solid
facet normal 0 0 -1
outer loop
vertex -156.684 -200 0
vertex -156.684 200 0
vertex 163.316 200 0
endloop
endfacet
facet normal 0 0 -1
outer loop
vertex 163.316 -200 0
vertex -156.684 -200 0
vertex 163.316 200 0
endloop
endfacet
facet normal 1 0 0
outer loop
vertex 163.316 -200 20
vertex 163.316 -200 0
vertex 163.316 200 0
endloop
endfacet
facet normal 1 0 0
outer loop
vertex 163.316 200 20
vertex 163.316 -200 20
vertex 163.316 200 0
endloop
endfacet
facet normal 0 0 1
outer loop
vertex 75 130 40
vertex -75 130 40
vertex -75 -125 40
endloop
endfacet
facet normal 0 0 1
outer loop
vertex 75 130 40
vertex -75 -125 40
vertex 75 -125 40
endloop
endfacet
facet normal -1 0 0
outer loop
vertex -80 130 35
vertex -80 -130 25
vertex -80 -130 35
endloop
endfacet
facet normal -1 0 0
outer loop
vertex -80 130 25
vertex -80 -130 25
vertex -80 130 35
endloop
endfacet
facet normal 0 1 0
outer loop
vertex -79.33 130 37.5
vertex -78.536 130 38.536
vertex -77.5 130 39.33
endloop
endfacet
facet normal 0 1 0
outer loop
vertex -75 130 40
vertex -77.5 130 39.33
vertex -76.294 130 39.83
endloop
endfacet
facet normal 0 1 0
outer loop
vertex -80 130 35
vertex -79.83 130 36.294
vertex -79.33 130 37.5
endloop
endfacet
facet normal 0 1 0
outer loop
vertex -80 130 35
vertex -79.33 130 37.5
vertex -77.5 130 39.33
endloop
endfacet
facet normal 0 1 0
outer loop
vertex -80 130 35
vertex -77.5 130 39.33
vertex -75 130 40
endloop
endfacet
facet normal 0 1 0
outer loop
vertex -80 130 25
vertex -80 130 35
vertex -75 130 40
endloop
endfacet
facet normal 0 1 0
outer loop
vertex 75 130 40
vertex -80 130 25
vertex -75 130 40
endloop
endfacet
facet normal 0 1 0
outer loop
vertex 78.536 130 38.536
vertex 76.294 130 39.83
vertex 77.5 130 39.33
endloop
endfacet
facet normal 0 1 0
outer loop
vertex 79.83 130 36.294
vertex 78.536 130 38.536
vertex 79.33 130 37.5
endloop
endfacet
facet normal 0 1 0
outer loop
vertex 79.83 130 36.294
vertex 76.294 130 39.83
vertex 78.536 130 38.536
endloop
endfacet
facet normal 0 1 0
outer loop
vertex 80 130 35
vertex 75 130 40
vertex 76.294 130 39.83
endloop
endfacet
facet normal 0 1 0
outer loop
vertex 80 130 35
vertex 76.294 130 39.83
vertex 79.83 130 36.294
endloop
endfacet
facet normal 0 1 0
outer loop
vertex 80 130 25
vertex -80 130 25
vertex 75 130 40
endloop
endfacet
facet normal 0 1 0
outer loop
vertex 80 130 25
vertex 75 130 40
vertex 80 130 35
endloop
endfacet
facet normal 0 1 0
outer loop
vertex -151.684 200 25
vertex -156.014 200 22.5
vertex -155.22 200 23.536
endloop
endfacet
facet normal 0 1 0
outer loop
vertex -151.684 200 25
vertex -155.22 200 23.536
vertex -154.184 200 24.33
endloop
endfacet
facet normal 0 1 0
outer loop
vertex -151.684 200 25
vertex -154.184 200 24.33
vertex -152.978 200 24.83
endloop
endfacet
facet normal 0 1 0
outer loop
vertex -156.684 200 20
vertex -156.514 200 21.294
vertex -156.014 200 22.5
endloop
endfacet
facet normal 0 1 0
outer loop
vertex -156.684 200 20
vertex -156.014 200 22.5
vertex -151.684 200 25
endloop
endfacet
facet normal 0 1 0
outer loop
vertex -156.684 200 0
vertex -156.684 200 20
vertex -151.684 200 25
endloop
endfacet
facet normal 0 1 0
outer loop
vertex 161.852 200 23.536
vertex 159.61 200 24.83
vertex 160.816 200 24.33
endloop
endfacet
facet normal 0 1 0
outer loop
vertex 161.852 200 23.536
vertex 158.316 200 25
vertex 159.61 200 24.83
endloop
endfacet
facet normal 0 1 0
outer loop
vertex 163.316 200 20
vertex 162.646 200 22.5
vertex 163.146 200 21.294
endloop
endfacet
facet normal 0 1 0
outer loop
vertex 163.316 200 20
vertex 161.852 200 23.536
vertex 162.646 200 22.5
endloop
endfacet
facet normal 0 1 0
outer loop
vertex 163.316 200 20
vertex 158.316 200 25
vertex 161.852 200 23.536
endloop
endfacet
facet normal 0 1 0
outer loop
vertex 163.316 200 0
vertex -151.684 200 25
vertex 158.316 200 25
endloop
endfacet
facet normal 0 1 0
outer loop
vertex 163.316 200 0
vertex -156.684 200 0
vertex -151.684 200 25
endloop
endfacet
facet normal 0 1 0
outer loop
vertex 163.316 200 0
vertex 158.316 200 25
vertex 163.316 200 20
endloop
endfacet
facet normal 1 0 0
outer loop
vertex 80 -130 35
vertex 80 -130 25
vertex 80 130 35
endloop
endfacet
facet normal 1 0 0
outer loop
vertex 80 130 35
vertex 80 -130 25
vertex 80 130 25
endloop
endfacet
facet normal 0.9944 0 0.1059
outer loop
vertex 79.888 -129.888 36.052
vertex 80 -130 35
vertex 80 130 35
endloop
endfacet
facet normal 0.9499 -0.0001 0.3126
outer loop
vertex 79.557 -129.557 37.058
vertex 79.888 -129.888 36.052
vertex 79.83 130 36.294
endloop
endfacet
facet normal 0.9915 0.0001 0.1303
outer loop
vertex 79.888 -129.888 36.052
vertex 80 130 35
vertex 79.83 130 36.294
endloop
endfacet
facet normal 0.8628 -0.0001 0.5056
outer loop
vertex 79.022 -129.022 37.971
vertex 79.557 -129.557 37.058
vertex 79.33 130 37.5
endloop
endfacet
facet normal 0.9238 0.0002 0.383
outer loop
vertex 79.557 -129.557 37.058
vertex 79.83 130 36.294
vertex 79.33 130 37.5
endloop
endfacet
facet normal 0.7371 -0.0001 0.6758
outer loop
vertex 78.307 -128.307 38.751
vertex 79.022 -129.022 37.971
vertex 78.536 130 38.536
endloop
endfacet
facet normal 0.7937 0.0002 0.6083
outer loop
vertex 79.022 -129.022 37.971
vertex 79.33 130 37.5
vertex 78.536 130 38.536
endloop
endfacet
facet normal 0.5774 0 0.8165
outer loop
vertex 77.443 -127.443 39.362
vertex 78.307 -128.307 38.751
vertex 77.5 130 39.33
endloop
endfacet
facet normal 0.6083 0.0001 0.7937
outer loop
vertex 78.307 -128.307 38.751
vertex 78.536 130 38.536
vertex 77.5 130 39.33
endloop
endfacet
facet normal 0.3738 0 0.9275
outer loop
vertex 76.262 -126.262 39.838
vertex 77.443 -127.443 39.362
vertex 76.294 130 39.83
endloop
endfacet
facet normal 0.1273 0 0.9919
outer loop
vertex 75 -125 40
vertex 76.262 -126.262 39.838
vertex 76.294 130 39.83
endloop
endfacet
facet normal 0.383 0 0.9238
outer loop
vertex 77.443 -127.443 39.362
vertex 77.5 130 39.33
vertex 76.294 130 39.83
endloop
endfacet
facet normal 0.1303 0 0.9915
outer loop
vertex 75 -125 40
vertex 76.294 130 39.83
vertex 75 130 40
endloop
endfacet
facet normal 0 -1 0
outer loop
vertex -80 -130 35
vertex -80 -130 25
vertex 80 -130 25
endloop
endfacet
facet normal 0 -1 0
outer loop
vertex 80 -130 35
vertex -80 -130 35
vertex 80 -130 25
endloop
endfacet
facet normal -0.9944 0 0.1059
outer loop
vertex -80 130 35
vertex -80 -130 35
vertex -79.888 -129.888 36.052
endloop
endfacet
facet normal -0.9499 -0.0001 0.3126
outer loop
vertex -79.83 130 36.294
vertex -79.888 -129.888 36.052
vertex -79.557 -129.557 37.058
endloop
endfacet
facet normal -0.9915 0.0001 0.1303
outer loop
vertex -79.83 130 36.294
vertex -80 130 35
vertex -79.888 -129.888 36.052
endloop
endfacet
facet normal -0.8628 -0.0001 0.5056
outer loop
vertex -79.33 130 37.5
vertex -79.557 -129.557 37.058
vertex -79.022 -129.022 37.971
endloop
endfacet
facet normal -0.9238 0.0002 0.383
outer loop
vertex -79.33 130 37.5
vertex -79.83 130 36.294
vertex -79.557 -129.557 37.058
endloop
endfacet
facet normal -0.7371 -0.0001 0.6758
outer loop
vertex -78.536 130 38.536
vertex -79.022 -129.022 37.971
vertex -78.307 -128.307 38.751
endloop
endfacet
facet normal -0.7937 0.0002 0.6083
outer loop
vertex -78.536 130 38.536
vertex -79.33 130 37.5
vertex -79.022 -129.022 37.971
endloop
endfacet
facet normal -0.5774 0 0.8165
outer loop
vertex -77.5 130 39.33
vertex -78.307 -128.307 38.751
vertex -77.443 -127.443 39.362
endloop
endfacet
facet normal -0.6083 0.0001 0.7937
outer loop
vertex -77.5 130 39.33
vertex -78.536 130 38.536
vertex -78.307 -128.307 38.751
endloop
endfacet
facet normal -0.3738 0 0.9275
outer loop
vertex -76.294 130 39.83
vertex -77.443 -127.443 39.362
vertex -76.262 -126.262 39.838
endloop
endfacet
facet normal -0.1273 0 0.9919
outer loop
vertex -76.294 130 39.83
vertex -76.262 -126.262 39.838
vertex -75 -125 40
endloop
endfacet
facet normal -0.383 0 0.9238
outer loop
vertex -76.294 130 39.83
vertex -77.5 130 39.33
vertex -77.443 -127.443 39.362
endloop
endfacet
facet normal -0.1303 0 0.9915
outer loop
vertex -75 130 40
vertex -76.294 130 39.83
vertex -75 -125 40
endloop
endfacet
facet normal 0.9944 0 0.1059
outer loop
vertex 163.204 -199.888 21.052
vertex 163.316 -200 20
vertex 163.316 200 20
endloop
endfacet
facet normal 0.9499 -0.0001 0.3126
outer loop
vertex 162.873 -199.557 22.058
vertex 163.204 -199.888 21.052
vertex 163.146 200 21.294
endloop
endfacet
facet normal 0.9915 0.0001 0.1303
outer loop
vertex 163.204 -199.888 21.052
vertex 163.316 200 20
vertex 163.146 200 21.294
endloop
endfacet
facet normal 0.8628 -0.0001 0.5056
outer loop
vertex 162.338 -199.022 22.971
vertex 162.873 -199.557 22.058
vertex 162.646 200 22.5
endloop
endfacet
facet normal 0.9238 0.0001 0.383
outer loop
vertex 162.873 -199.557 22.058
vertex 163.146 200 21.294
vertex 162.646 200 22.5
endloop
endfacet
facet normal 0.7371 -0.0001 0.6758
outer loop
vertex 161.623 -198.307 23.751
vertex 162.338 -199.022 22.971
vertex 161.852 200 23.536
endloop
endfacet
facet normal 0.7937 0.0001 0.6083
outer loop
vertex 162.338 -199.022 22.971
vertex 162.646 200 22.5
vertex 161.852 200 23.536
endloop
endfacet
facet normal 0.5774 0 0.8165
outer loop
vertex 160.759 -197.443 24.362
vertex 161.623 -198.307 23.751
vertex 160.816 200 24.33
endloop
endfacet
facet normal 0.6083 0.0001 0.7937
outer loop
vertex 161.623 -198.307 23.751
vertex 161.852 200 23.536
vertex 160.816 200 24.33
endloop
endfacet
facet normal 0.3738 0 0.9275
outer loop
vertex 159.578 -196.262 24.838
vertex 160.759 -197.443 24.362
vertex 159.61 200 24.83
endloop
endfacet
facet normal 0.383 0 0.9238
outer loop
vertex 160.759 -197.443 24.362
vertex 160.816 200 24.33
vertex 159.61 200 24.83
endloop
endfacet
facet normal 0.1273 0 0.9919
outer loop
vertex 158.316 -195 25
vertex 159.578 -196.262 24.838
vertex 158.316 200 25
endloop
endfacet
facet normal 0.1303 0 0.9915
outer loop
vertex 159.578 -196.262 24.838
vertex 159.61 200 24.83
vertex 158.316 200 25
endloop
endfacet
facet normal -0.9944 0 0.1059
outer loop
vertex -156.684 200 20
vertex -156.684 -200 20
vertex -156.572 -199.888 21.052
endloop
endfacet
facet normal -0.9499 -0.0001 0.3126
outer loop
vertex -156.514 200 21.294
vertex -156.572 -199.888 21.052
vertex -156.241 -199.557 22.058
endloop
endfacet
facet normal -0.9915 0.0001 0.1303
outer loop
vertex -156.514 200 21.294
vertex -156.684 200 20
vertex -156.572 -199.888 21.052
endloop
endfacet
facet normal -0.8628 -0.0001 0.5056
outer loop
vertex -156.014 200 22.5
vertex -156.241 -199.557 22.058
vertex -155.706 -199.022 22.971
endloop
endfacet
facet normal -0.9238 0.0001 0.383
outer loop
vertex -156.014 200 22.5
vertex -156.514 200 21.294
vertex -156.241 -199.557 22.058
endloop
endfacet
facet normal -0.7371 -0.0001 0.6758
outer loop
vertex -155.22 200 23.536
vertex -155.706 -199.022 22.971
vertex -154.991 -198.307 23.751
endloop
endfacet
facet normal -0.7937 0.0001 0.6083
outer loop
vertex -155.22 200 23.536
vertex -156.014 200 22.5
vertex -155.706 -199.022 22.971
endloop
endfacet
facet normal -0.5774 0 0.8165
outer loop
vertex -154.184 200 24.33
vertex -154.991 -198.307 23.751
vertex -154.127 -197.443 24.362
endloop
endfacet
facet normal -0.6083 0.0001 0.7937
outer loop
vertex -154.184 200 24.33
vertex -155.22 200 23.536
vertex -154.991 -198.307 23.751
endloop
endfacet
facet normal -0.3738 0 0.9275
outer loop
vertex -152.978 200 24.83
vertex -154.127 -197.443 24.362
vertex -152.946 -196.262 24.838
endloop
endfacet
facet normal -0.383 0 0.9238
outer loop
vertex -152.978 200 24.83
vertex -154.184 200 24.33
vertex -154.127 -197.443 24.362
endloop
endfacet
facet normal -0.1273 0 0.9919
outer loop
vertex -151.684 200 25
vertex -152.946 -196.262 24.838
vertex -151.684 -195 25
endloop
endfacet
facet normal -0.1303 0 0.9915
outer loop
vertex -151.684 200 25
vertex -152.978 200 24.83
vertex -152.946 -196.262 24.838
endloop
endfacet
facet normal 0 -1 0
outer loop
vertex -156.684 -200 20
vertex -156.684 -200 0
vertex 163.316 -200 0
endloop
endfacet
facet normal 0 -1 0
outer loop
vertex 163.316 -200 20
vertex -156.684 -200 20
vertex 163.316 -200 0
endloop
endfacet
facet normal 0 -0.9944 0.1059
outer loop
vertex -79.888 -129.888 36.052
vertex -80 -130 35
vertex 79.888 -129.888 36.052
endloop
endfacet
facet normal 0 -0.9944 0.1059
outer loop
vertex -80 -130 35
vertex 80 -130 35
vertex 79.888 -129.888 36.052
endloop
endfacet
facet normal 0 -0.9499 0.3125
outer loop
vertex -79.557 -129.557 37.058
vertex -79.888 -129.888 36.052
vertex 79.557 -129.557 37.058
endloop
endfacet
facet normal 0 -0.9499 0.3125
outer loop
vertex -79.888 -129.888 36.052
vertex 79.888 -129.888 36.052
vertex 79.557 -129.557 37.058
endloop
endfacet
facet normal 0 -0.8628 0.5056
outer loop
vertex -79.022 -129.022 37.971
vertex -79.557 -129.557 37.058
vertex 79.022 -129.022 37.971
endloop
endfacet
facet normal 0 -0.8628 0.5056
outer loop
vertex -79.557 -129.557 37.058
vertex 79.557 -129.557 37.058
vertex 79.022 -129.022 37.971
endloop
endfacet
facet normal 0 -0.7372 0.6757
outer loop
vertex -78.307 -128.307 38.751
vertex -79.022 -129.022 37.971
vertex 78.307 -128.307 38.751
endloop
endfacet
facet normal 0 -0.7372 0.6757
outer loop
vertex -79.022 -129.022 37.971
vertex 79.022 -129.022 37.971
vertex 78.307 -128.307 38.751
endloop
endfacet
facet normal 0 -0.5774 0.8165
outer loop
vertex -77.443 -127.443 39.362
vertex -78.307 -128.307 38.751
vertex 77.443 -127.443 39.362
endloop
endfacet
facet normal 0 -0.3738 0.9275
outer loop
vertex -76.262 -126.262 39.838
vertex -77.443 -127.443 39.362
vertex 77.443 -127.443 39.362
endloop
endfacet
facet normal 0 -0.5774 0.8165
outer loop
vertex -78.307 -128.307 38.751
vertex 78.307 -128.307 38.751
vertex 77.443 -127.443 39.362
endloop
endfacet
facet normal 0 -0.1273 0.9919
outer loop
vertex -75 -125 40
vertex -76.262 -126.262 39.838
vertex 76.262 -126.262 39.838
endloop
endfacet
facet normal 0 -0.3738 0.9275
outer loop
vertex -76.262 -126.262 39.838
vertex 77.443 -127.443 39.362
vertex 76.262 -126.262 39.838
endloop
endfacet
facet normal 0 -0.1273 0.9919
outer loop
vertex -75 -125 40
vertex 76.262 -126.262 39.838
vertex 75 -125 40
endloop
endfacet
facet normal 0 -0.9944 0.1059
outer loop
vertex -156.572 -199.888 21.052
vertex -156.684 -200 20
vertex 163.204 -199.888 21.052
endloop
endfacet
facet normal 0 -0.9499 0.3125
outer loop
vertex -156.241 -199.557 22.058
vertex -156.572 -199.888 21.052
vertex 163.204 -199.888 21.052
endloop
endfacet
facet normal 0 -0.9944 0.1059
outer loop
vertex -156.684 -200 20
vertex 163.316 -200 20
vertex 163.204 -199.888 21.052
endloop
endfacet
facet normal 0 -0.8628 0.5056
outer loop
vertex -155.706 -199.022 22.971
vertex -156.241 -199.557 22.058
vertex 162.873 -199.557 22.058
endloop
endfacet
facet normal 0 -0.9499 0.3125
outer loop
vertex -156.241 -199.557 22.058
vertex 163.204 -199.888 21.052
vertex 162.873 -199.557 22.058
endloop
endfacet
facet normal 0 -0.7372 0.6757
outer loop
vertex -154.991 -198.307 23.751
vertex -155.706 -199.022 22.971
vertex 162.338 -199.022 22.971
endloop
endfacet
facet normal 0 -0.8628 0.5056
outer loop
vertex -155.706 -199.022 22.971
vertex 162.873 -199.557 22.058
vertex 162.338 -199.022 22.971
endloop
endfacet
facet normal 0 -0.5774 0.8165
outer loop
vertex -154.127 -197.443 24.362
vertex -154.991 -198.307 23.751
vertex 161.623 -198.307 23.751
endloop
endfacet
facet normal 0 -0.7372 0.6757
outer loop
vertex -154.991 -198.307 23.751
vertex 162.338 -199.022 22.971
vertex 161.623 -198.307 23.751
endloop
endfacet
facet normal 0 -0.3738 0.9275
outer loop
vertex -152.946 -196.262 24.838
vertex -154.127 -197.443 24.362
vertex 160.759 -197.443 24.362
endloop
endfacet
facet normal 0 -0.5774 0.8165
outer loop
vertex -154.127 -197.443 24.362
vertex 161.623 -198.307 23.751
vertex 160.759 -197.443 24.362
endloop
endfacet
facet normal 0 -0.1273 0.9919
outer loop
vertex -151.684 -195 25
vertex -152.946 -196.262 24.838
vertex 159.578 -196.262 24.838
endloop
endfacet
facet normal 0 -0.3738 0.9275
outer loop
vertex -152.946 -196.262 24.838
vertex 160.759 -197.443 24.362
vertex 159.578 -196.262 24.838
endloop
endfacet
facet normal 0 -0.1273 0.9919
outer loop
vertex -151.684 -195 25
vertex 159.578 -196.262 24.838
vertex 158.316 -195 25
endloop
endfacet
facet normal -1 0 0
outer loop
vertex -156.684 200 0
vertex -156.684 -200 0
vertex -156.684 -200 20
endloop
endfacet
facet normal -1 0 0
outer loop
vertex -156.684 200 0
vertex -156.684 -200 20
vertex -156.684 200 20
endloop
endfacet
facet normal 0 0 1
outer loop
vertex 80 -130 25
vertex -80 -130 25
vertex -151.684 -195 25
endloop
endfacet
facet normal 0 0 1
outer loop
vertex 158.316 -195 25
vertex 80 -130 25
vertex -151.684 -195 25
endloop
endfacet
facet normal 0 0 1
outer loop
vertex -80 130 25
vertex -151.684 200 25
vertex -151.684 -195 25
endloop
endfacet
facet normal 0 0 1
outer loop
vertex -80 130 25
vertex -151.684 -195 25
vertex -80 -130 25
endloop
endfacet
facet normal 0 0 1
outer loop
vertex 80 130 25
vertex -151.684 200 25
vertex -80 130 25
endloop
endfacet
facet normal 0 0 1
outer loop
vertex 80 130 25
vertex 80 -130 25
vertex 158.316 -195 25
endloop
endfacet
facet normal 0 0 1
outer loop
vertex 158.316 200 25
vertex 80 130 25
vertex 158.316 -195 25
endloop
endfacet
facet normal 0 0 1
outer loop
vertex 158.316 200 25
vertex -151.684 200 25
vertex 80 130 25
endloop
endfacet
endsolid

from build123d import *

# Parameters (mm, degrees)
F0_W     = 320
F0_H     = 400
F1_DEPTH = 25
F3_R     = 5
F4_W     = 160
F4_H     = 260
F5_DEPTH = 15
F6_R     = 5


with BuildPart() as f1:
    # F0 (on Top) → F1 (new body)
    with BuildSketch(Plane.XY):
        with Locations((3.315994, 0)):
            Rectangle(F0_W, F0_H)
    extrude(amount=F1_DEPTH)

    # F3
    f3_edges = [f1.edges().sort_by_distance(p)[0] for p in [
        (-156.684006, 0, 25),
        (163.315994, 0, 25),
        (3.315994, -200, 25),
    ]]
    fillet(f3_edges, radius=F3_R)

    # F4 (on face) → F5 (join)
    with BuildSketch(Plane.XY.offset(25)):
        Rectangle(F4_W, F4_H)
    extrude(amount=F5_DEPTH)

    # F6
    f6_edges = [f1.edges().sort_by_distance(p)[0] for p in [
        (-80, 0, 40),
        (0, -130, 40),
        (80, 0, 40),
    ]]
    fillet(f6_edges, radius=F6_R)


solid = f1.part
